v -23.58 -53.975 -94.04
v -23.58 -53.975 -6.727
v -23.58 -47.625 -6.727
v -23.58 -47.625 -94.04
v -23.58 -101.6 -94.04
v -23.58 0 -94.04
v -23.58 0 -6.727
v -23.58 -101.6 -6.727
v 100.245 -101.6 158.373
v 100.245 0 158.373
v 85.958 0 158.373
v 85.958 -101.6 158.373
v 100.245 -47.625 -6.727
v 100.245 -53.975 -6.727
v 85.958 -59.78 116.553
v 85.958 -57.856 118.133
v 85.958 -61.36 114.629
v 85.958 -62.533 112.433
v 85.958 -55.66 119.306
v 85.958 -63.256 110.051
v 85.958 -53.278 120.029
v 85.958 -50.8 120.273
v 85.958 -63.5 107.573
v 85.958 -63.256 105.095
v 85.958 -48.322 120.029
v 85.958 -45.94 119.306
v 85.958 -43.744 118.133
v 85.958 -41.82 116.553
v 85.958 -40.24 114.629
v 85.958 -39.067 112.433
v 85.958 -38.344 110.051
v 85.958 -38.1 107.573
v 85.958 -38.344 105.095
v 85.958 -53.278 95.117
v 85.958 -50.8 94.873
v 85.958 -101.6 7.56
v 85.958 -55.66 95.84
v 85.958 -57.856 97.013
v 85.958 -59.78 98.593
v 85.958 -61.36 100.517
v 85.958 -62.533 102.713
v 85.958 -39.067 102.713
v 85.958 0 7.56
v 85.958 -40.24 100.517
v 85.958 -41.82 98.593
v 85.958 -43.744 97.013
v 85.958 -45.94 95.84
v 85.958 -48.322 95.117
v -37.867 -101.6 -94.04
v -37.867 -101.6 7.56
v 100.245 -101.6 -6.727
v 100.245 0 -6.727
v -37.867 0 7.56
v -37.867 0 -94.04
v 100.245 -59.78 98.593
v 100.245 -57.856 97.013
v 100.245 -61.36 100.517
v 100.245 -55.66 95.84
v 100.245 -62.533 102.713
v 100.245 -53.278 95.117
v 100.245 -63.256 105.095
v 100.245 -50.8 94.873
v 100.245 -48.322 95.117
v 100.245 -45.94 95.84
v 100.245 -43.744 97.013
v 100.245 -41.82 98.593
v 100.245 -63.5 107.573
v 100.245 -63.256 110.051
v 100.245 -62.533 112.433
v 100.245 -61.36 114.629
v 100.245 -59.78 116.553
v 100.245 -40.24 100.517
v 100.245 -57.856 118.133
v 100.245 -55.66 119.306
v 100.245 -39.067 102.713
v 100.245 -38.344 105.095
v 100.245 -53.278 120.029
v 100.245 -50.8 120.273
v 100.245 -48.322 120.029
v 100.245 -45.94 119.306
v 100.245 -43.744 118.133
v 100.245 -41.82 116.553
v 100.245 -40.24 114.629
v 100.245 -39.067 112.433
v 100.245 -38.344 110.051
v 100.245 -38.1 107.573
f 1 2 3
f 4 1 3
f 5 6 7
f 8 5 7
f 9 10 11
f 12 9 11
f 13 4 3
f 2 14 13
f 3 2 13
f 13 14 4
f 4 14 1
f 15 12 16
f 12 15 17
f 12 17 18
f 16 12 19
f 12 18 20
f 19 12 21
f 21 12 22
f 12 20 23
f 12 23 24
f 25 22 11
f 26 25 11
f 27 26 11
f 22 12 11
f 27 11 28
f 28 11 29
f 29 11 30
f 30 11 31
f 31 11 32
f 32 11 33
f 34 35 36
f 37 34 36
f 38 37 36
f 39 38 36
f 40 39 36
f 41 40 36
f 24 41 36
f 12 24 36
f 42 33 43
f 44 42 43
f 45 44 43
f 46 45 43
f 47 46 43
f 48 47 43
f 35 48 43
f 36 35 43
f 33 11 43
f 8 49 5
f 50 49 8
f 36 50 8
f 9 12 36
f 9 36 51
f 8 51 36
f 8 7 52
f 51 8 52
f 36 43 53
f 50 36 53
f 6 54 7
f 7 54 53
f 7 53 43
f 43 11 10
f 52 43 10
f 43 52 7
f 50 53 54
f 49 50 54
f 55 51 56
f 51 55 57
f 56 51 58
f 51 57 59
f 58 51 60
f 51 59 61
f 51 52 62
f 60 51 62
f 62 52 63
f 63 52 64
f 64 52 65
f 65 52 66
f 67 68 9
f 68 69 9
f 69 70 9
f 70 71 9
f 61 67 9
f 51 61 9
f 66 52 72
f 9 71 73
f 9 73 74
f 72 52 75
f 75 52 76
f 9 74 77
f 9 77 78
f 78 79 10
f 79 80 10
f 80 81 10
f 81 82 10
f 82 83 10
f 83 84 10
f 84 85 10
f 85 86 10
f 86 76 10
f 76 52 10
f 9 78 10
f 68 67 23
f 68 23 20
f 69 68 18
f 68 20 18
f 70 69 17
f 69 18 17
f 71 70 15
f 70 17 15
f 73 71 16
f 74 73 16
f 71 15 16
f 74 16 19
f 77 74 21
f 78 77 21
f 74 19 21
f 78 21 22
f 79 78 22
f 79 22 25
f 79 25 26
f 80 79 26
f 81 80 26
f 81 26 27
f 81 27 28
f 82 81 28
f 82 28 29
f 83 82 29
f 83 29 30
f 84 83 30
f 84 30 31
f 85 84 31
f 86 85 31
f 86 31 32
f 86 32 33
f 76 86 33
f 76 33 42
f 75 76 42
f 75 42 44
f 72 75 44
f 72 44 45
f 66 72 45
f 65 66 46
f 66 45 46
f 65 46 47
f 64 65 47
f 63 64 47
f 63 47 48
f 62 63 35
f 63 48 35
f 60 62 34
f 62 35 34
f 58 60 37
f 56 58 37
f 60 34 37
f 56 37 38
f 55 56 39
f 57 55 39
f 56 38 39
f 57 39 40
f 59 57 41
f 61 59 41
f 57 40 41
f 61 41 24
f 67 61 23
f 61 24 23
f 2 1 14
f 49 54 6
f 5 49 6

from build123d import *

# Parameters (mm, degrees)
F1_DEPTH  = 101.6
F3_D      = 25.4
F4_W      = 101.6
F4_H      = 87.3125
F5_DEPTH  = 123.825
F7_DEPTH  = 101.601
F8_W      = 151.5127165662
F8_H      = 47.625
F9_DEPTH  = 214.5206515044
F10_DEPTH = 214.5206515044


with BuildPart() as f1:
    # F0 (on Front) → F1 (new body)
    with BuildSketch(Plane.XZ):
        Polygon((-37.8673051461, 7.5604184782), (-37.8673051461, -94.0395815218), (-23.5798051461, -94.0395815218), (-23.5798051461, -6.7270815218), (100.2451948539, -6.7270815218), (100.2451948539, 158.3729184782), (85.9576948539, 158.3729184782), (85.9576948539, 7.5604184782), align=None)
    extrude(amount=F1_DEPTH)

    # F3 (through all)
    with Locations(Plane.YZ.offset(100.2451948539)):
        with Locations((-50.8, 107.5729184782)):
            Hole(F3_D / 2)


with BuildPart() as f5:
    # F4 (on face) → F5 (new body, through all)
    with BuildSketch(Plane.YZ.offset(-23.5798051461)):
        with Locations((-50.8, -50.3833315218)):
            Rectangle(F4_W, F4_H)
    extrude(amount=F5_DEPTH)

    # F6 (on face) → F7 (cut, through all)
    with BuildSketch(Plane.XZ.offset(101.6)):
        Polygon((100.2451948539, -6.7270815218), (-23.5798051461, -94.0395815218), (100.2451948539, -94.0395815218), align=None)
    extrude(amount=-F7_DEPTH, mode=Mode.SUBTRACT)

    # F8 (on face) → F9 (cut, through all)
    with BuildSketch(Plane(origin=(36.4585458515, 0, -51.704846844), x_dir=(0.8172581339, 0, 0.5762717611), z_dir=(0.5762717611, 0, -0.8172581339))):
        with Locations((2.2932154783, 77.7875)):
            Rectangle(F8_W, F8_H)
    extrude(amount=-F9_DEPTH, mode=Mode.SUBTRACT)

    # F8 (on face) → F10 (cut, through all)
    with BuildSketch(Plane(origin=(36.4585458515, 0, -51.704846844), x_dir=(0.8172581339, 0, 0.5762717611), z_dir=(0.5762717611, 0, -0.8172581339))):
        with Locations((2.2932154783, 23.8125)):
            Rectangle(F8_W, F8_H)
    extrude(amount=-F10_DEPTH, mode=Mode.SUBTRACT)


solid = Compound([f1.part, f5.part])
